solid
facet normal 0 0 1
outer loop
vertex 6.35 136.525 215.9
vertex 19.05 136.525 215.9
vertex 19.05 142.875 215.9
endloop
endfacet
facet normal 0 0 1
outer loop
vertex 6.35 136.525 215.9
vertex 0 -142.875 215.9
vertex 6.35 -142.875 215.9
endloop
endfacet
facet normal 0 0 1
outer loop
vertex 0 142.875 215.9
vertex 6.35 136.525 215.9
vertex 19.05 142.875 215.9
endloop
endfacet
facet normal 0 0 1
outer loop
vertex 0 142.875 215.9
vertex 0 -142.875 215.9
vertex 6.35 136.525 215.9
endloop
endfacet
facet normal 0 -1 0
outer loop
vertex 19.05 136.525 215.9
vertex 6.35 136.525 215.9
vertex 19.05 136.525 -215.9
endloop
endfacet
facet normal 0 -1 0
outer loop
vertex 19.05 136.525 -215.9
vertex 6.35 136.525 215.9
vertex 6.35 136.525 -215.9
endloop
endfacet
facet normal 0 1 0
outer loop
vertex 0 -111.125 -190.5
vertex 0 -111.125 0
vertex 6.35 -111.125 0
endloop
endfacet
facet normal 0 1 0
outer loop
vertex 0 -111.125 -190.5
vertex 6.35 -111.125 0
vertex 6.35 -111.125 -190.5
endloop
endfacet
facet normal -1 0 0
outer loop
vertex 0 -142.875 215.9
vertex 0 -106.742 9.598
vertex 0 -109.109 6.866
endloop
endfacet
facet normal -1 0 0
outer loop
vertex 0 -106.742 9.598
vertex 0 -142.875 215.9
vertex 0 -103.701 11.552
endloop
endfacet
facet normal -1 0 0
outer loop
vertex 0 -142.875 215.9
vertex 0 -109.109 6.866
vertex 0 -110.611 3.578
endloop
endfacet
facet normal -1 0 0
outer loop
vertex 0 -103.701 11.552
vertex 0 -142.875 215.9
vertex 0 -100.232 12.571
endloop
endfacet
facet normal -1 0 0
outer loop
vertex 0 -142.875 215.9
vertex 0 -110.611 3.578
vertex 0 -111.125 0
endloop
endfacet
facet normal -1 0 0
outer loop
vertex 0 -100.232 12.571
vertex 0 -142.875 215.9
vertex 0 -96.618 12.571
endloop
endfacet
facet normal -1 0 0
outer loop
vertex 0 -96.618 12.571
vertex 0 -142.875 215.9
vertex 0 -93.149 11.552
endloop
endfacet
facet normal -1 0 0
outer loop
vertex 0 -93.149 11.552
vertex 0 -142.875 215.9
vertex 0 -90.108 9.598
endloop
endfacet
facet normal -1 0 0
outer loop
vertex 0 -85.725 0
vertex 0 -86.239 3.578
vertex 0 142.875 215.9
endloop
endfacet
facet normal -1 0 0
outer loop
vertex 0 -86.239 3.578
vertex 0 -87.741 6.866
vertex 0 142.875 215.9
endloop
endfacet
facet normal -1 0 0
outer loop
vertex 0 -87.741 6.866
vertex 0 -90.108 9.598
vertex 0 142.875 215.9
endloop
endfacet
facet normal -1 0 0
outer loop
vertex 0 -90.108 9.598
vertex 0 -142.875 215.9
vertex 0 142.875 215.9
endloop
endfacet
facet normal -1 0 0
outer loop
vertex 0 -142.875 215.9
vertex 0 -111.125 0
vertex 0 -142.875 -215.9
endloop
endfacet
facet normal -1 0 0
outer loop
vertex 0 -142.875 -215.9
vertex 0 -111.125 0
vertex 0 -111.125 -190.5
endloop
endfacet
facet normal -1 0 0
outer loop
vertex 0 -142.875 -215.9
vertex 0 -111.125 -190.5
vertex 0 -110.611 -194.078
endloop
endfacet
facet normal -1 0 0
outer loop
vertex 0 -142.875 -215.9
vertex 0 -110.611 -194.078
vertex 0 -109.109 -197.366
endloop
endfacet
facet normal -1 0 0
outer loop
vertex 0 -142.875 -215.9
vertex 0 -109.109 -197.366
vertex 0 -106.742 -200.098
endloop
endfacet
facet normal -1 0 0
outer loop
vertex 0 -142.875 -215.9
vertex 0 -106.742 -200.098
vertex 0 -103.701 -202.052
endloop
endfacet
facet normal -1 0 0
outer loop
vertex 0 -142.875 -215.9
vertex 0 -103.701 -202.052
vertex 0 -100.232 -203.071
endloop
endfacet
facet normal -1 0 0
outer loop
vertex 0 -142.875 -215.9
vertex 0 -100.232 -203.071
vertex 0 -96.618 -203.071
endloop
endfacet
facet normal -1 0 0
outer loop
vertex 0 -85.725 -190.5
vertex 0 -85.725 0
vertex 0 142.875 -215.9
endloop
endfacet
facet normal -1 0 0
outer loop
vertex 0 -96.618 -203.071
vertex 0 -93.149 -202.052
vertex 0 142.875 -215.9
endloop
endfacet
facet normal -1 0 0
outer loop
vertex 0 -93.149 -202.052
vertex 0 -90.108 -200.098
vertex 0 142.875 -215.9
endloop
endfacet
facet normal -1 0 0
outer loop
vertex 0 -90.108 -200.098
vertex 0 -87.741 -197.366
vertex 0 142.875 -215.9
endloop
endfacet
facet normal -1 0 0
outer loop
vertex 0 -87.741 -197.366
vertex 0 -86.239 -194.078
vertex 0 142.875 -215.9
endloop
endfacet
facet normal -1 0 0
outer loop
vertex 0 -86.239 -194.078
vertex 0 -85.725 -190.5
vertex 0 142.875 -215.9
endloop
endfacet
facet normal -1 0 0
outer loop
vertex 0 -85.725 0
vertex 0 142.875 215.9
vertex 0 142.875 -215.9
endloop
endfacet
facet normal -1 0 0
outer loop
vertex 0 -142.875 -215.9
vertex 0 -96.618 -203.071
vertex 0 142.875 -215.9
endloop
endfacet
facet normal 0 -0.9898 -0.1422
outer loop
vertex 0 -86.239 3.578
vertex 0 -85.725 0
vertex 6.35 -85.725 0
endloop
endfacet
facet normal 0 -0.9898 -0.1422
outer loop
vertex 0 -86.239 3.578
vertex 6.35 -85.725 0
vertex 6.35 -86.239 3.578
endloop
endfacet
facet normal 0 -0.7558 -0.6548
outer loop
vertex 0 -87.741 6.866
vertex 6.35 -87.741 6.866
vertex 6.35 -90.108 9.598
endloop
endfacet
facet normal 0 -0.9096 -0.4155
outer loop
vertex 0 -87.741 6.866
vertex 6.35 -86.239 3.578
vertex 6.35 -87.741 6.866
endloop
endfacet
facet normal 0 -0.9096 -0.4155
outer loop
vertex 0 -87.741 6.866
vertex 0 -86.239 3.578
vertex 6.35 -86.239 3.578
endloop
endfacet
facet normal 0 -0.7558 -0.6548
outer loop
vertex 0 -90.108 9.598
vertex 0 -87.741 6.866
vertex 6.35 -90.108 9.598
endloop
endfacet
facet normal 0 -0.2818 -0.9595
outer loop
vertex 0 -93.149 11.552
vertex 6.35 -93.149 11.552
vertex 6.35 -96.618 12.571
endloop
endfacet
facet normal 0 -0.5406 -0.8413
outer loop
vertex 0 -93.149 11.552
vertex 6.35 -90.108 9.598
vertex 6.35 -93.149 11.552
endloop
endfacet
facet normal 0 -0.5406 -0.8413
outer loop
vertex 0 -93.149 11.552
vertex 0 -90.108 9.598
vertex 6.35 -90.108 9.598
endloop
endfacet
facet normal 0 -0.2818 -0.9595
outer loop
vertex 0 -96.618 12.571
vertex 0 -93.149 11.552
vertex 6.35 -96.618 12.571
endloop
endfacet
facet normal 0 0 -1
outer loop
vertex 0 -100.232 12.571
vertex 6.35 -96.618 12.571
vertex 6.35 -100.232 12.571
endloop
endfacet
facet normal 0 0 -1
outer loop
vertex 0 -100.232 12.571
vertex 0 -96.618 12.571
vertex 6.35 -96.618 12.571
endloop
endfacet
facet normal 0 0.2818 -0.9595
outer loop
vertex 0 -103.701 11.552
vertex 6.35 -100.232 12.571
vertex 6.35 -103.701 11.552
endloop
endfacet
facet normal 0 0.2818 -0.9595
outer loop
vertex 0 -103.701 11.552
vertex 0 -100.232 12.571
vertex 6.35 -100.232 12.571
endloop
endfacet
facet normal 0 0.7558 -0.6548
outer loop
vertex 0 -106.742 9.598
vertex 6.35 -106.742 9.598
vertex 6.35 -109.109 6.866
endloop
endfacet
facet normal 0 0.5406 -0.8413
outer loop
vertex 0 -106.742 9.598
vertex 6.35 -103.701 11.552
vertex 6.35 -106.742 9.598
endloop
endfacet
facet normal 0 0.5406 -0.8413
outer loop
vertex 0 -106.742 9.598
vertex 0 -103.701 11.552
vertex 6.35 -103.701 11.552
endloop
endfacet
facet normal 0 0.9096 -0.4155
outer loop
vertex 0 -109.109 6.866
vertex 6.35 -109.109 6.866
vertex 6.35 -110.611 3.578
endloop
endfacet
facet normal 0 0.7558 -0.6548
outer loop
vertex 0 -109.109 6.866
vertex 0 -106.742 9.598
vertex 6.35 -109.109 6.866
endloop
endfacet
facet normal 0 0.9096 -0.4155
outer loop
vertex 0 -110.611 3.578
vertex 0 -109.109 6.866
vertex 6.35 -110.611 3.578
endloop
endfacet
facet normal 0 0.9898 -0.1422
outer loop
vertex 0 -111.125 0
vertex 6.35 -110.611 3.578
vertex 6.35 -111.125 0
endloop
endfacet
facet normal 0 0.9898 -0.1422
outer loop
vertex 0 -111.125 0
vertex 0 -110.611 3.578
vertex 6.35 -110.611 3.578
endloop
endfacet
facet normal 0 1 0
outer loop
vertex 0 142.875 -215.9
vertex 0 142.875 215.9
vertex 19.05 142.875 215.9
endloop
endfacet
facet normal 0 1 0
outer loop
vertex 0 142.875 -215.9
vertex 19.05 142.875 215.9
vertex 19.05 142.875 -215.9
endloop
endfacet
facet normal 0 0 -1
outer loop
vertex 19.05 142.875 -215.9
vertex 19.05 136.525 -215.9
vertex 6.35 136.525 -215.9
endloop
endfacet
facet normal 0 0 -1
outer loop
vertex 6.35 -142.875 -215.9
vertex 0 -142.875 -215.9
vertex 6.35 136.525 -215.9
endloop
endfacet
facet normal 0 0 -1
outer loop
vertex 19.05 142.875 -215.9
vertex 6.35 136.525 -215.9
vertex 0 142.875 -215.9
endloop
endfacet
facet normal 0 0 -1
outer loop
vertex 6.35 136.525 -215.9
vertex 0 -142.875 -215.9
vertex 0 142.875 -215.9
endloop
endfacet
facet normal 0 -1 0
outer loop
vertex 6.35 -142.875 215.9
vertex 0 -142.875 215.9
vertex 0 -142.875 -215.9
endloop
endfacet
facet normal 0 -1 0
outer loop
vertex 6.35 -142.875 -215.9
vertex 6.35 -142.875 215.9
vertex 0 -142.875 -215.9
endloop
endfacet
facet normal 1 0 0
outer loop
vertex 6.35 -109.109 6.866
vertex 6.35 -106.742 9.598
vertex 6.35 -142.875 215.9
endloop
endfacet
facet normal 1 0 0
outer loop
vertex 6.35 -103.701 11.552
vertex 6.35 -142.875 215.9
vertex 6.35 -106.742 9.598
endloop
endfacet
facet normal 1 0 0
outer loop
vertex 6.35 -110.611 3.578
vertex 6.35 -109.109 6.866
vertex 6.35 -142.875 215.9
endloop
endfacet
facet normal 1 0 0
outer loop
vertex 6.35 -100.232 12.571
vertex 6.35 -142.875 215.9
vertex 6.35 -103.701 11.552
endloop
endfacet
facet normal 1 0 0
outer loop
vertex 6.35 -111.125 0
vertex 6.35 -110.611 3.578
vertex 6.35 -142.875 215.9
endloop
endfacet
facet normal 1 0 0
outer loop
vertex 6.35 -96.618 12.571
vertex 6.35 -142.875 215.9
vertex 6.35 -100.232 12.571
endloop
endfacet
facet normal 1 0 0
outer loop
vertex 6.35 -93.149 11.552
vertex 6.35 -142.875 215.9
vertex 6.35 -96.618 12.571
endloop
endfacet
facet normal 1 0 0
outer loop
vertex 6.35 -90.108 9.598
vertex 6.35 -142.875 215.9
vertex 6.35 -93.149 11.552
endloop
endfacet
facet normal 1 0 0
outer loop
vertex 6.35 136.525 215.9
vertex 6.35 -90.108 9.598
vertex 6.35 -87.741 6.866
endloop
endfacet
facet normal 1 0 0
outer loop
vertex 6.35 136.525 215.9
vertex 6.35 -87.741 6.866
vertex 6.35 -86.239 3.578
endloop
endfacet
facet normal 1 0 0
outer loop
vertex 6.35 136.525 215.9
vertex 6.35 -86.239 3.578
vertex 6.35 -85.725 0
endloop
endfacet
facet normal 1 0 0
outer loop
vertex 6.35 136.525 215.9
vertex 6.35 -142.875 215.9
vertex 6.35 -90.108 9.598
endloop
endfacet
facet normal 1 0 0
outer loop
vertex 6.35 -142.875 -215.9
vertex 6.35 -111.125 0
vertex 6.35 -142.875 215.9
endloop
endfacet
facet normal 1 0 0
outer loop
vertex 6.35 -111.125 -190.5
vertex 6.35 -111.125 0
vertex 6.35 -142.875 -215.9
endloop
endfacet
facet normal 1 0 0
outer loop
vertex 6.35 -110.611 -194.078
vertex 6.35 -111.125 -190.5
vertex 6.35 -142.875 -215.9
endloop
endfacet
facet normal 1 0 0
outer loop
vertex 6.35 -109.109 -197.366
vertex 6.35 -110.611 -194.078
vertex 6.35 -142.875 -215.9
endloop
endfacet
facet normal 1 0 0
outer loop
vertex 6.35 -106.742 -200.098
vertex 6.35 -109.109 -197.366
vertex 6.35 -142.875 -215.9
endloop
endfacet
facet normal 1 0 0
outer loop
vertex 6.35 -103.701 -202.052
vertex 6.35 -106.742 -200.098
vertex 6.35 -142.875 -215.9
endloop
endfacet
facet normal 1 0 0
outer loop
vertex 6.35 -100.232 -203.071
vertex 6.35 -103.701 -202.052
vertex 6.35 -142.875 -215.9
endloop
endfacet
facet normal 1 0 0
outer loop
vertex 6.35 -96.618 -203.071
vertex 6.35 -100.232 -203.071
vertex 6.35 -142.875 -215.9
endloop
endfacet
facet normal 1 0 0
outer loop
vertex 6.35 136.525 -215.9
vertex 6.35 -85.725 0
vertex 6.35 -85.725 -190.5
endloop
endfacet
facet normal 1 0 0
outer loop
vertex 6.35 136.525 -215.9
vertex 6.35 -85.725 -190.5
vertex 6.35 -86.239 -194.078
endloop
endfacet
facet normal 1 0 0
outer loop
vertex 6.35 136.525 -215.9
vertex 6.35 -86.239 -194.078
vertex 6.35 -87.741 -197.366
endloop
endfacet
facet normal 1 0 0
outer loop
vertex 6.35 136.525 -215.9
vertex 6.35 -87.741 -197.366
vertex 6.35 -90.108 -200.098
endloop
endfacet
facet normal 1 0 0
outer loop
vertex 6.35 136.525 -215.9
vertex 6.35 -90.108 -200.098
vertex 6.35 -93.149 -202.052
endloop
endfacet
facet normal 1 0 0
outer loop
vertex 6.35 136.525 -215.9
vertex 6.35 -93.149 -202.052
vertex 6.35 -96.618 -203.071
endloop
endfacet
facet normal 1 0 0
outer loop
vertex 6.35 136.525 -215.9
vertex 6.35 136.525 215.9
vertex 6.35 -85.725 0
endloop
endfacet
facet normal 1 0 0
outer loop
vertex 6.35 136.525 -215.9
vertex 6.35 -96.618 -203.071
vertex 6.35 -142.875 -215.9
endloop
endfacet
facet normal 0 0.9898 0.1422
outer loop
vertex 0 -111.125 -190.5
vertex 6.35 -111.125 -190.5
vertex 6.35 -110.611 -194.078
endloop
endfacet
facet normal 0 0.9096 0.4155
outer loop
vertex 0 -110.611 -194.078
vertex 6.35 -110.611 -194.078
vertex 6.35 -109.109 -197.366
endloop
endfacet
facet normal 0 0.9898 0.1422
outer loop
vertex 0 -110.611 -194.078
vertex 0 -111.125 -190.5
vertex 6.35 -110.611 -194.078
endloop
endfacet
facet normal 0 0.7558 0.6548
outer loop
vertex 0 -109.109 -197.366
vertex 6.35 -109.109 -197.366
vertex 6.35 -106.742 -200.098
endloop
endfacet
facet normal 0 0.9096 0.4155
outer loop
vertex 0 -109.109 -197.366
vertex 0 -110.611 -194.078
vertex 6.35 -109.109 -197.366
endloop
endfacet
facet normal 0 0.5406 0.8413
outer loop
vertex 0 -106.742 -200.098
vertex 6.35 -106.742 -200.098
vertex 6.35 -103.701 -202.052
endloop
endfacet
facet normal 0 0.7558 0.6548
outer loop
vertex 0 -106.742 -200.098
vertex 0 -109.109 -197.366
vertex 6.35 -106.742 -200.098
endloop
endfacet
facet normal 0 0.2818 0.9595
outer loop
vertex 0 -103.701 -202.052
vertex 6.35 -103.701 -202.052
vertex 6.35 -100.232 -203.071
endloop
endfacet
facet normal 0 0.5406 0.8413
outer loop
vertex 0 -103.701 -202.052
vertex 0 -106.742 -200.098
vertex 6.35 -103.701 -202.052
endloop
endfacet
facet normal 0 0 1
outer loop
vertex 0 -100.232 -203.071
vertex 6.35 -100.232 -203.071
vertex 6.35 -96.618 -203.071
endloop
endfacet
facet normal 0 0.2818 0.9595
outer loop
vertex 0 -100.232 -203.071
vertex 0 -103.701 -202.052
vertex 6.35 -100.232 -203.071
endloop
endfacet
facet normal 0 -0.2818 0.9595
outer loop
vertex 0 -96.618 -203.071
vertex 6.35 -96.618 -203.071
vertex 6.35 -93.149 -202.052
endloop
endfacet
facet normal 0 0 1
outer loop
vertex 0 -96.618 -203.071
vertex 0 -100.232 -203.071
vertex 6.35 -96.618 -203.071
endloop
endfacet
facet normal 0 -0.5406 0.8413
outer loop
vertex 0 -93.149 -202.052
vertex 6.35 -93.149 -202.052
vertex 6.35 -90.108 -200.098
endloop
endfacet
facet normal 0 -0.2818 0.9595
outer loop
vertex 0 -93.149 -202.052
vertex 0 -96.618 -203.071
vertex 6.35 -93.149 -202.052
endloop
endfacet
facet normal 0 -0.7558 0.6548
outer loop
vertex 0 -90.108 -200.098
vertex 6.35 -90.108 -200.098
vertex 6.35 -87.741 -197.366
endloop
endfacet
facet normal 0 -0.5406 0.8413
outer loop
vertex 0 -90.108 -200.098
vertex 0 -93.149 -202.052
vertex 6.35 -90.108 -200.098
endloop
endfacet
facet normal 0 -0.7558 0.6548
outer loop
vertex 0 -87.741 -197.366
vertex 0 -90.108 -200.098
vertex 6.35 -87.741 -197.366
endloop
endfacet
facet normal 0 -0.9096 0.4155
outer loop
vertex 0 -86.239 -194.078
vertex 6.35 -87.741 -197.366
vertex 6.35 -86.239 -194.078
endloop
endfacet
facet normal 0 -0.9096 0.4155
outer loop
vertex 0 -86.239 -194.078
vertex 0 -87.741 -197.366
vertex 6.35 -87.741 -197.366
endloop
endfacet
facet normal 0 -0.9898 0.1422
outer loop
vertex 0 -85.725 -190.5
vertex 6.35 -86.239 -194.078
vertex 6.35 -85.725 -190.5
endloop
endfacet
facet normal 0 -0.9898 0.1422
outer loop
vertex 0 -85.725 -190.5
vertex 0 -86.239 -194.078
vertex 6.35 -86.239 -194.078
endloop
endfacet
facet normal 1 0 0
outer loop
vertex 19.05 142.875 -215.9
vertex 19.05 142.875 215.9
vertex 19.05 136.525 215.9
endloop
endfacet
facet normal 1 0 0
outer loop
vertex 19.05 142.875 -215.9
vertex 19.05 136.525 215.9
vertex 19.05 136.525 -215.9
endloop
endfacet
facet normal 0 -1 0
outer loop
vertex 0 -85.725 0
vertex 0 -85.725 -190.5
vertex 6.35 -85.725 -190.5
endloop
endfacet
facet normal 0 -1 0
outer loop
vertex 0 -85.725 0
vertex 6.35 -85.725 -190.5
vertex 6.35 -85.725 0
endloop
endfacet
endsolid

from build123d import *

# Parameters (mm, degrees)
SKETCH1_W           = 431.8
SKETCH1_H           = 285.75
BOSS_EXTRUDE1_DEPTH = 6.35
SKETCH2_W           = 431.8
SKETCH2_H           = 6.35
BOSS_EXTRUDE2_DEPTH = 12.7
CUT_EXTRUDE1_DEPTH  = 20.05


with BuildPart() as part:
    # Sketch1 → Boss-Extrude1 (new body)
    with BuildSketch(Plane(origin=(0, 0, 0), x_dir=(0, 0, -1), z_dir=(1, 0, 0))):
        Rectangle(SKETCH1_W, SKETCH1_H)
    extrude(amount=BOSS_EXTRUDE1_DEPTH)

    # Sketch2 → Boss-Extrude2 (add)
    with BuildSketch(Plane(origin=(6.35, 0, 0), x_dir=(0, 0, -1), z_dir=(1, 0, 0))):
        with Locations((0, 139.7)):
            Rectangle(SKETCH2_W, SKETCH2_H)
    extrude(amount=BOSS_EXTRUDE2_DEPTH)

    # Sketch3 → Cut-Extrude1 (cut, through all)
    with BuildSketch(Plane.ZY):
        with BuildLine():
            Line((-190.5, -85.725), (0, -85.725))
            ThreePointArc((0, -85.725), (12.7, -98.425), (0, -111.125))
            Line((0, -111.125), (-190.5, -111.125))
            ThreePointArc((-190.5, -111.125), (-203.2, -98.425), (-190.5, -85.725))
        make_face()
    extrude(amount=-CUT_EXTRUDE1_DEPTH, mode=Mode.SUBTRACT)


solid = part.part
